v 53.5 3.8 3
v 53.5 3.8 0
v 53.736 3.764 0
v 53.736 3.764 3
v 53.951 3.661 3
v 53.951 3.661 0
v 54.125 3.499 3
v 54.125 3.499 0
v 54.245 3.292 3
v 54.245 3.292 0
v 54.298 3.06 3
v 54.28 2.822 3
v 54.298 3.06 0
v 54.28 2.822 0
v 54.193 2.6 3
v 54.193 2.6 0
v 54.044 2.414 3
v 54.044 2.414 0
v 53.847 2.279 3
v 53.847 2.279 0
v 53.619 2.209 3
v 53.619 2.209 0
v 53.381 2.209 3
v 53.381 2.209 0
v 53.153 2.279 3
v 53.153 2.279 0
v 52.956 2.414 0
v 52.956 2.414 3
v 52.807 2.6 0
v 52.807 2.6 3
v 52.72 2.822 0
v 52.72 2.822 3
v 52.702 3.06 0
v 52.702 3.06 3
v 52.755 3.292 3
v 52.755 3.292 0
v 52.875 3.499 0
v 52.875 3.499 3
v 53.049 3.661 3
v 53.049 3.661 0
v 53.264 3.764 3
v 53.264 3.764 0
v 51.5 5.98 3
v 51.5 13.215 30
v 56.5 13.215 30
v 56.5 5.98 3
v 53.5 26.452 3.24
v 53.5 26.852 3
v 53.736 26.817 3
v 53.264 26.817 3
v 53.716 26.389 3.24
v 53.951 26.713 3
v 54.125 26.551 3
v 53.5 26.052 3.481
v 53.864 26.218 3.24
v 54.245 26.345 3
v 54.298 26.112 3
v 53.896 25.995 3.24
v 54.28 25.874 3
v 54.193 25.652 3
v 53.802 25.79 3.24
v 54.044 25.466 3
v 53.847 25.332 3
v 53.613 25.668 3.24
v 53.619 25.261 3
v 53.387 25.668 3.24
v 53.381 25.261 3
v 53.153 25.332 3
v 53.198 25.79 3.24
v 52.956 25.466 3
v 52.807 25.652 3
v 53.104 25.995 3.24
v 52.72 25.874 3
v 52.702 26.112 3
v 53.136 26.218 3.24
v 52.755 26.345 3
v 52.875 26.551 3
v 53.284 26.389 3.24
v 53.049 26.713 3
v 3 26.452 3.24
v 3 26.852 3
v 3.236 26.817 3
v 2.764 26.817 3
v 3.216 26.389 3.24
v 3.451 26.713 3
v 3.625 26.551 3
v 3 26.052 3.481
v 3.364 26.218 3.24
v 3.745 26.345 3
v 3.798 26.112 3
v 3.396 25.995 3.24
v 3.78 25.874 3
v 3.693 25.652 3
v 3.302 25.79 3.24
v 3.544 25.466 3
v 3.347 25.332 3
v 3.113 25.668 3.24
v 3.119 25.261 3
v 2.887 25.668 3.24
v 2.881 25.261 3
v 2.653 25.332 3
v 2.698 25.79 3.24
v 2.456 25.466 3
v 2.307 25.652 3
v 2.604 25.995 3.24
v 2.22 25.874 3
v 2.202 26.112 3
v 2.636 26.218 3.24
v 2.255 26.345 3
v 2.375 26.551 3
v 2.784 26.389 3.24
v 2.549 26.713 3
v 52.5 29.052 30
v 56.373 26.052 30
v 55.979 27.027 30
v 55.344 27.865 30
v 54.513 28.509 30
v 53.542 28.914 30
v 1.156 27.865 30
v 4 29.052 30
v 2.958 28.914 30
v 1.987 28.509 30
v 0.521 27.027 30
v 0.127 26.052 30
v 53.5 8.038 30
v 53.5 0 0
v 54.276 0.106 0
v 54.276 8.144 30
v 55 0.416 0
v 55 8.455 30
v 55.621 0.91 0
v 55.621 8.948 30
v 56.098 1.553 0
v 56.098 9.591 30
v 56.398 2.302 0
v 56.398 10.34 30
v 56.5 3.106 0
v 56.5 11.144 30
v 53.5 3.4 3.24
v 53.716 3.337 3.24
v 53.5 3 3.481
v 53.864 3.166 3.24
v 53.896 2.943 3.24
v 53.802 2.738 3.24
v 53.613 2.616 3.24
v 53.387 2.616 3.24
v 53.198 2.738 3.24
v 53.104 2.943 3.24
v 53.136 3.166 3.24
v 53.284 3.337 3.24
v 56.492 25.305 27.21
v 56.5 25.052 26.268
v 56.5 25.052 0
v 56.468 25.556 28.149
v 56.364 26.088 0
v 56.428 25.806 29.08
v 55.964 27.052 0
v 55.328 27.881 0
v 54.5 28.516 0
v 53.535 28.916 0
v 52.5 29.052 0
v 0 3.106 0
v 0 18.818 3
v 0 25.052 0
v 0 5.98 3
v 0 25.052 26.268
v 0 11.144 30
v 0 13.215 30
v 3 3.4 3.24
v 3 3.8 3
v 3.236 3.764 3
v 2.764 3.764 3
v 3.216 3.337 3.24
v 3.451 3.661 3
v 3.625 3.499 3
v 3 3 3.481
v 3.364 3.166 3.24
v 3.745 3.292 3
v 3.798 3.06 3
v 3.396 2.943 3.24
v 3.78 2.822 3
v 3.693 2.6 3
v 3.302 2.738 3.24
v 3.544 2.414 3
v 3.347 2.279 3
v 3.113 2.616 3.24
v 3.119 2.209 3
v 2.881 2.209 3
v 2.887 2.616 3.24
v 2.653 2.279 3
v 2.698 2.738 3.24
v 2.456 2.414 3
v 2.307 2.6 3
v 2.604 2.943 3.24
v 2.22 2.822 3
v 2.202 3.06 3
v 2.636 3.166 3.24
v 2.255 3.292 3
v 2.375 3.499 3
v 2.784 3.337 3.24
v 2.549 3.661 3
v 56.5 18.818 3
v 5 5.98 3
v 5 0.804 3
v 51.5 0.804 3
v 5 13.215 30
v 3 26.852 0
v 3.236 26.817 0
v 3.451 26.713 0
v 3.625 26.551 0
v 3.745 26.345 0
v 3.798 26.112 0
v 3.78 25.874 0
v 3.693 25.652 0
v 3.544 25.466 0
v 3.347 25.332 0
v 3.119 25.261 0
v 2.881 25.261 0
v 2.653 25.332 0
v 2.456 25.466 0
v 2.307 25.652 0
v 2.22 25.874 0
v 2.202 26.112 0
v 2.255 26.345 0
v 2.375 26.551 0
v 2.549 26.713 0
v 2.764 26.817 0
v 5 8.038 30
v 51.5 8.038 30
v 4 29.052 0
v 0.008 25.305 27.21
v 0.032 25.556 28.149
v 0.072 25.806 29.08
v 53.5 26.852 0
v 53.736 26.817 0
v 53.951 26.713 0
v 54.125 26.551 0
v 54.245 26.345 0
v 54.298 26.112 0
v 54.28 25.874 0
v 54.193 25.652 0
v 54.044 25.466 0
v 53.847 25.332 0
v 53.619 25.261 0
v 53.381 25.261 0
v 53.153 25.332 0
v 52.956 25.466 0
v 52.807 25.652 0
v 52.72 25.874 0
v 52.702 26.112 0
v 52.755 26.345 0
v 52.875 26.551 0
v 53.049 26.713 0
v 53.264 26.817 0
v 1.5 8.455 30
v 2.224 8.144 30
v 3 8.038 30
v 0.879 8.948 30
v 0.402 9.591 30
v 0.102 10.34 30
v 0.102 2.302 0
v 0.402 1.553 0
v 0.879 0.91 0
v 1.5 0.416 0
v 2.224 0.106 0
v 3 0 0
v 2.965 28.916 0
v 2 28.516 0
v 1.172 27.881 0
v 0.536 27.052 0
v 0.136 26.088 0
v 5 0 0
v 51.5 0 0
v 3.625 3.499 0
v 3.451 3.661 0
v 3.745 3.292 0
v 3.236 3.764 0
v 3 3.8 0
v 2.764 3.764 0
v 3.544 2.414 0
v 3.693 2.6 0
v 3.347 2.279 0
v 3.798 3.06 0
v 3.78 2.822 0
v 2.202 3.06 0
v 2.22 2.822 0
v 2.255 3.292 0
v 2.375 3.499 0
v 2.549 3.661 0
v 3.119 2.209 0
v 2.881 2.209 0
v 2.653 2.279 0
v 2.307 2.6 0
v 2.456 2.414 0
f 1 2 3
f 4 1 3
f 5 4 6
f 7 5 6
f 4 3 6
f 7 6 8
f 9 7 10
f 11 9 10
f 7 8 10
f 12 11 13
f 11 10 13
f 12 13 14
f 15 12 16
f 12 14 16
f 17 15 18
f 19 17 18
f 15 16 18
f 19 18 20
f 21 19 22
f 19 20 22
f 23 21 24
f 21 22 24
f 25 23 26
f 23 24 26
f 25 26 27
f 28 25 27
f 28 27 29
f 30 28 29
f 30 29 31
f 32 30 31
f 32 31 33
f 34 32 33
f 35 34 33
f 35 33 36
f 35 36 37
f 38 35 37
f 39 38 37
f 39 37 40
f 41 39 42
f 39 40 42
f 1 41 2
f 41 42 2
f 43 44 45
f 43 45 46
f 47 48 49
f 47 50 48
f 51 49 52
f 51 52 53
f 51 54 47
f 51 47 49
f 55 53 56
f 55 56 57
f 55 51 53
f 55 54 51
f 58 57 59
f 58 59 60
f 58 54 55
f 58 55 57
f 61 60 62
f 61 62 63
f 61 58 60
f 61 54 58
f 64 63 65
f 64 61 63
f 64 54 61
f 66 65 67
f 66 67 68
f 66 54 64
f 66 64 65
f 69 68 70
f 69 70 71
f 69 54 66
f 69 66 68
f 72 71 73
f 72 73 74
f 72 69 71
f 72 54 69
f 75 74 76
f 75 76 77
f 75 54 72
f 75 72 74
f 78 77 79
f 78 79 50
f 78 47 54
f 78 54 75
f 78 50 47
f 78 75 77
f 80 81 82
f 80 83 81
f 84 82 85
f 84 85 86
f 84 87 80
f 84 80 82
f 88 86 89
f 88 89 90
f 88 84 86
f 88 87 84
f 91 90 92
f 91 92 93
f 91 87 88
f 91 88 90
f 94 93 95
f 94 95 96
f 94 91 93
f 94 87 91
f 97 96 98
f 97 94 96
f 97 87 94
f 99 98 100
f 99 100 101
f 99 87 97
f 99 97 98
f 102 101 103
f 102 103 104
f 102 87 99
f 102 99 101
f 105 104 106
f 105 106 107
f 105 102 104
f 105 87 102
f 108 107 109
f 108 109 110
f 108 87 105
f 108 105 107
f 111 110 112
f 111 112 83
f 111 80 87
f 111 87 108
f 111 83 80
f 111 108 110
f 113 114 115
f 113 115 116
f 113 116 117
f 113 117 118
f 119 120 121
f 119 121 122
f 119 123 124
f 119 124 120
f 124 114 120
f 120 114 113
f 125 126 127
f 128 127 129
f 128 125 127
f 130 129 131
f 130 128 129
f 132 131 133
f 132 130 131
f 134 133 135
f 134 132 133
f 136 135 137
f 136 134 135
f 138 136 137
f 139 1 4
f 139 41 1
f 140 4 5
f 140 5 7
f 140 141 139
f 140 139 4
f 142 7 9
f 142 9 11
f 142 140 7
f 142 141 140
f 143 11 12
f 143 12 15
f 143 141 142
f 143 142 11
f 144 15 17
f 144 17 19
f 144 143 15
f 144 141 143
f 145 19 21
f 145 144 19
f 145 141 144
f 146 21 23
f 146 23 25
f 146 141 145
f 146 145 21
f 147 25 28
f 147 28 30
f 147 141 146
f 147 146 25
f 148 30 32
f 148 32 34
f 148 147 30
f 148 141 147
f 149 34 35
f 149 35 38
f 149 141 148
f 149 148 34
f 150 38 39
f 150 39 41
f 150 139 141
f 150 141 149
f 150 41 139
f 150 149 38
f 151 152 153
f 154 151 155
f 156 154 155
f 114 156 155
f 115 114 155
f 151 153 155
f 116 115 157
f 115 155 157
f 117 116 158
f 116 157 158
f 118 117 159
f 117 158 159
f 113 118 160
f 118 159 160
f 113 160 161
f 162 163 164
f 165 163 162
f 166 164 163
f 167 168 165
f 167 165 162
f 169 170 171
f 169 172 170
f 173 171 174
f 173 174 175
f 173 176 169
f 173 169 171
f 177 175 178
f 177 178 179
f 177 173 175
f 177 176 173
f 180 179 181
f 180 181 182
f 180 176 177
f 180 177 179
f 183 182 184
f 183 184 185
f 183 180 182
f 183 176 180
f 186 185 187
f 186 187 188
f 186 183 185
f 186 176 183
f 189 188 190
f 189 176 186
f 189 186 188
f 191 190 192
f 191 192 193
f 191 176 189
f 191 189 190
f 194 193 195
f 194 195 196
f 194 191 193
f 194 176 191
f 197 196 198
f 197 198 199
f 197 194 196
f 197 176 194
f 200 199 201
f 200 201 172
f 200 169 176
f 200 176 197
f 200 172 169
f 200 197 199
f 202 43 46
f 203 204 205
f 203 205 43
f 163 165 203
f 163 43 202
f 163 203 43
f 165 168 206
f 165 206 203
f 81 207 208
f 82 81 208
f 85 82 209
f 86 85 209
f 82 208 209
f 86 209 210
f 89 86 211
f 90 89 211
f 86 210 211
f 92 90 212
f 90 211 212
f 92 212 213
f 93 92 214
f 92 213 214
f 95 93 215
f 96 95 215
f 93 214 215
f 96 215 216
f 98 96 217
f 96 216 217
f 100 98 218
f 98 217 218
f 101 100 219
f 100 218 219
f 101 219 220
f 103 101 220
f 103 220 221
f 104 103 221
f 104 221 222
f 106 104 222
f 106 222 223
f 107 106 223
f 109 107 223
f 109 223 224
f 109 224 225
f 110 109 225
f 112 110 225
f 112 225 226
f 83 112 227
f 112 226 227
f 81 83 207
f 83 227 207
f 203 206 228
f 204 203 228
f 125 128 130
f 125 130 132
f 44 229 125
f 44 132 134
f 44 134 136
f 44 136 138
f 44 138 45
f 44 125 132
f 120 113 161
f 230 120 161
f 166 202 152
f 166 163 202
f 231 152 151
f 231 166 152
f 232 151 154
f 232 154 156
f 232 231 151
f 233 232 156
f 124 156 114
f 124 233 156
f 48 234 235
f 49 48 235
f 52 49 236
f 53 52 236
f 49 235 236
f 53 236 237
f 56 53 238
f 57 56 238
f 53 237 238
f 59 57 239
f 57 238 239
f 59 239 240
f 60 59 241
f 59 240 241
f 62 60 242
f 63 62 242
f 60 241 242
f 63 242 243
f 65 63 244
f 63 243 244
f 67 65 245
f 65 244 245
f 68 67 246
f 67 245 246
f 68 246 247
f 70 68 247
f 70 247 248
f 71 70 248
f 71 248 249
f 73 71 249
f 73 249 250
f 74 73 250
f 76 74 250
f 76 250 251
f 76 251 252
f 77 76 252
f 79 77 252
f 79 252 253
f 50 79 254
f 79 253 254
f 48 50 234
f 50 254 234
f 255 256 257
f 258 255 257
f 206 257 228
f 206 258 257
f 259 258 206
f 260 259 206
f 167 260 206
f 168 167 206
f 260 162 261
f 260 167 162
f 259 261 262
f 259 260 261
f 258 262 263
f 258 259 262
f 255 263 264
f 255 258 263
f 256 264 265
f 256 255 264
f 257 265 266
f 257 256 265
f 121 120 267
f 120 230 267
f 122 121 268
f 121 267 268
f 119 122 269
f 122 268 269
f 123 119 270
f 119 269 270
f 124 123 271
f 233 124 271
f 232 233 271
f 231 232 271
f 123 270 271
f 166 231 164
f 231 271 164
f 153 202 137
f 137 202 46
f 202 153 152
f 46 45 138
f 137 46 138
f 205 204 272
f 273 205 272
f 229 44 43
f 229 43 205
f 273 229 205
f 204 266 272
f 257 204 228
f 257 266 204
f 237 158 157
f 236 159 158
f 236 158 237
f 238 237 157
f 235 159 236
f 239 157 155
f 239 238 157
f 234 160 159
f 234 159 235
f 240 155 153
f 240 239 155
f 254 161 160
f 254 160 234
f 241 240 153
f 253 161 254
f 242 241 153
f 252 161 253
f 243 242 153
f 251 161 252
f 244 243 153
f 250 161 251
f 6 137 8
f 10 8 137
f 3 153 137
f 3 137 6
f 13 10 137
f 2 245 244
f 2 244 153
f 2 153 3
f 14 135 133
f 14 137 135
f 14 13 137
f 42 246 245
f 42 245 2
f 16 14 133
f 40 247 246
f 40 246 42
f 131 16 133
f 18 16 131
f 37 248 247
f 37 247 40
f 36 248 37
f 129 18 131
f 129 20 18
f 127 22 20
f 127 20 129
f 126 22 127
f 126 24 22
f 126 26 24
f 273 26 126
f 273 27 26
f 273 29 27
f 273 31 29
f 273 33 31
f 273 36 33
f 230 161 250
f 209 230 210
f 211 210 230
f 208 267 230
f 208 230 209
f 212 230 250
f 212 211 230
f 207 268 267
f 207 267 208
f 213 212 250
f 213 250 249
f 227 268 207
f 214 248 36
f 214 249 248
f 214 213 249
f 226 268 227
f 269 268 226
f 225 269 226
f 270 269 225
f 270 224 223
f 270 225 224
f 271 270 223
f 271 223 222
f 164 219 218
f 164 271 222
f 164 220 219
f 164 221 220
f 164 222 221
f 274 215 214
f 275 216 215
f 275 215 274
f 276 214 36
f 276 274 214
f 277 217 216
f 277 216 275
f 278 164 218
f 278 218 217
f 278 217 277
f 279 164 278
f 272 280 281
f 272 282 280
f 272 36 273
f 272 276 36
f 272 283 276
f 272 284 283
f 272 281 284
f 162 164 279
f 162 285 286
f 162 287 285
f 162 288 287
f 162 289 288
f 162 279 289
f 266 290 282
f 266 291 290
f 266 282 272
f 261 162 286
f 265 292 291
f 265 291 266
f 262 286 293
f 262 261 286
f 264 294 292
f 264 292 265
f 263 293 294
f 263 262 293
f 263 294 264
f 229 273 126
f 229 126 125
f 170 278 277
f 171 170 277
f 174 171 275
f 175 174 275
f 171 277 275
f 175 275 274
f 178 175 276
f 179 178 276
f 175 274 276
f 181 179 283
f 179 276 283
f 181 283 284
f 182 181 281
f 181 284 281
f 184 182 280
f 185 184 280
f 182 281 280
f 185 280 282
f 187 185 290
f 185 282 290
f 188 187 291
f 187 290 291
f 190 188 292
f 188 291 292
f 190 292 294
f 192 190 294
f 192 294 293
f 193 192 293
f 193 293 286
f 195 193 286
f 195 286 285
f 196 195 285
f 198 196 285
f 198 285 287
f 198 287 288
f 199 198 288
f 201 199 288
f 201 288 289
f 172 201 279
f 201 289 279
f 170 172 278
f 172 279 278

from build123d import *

# Parameters (mm, degrees)
PAD_DEPTH    = 5
PAD001_DEPTH = 51.5
PAD002_DEPTH = 5
FILLET_R     = 3
FILLET001_R  = 4
SKETCH003_R  = 0.8
HOLE_DEPTH   = 3
HOLE_TIPS_R  = 0.8


with BuildPart() as part:
    # Sketch → Pad (new body)
    with BuildSketch(Plane.YZ):
        Polygon((0, 0), (8.038476, 30), (13.214857, 30), (5.980228, 3), (18.817653, 3), (26.052281, 30), (29.052281, 30), (29.052281, 0), align=None)
    extrude(amount=PAD_DEPTH)

    # Sketch001 → Pad001 (join)
    with BuildSketch(Plane.YZ):
        Polygon((0, 0), (29.052281, 0), (29.052281, 30), (26.052281, 30), (18.817653, 3), (0.803848, 3), align=None)
    extrude(amount=PAD001_DEPTH)

    # Sketch002 (on Face14 of Pad001) → Pad002 (join)
    with BuildSketch(Plane.YZ.offset(51.5)):
        Polygon((0, 0), (8.038476, 30), (13.214857, 30), (5.980228, 3), (18.817653, 3), (26.052281, 30), (29.052281, 30), (29.052281, 0), align=None)
    extrude(amount=PAD002_DEPTH)

    # Fillet
    fillet_edges = [part.edges().sort_by_distance(p)[0] for p in [
        (0, 4.421162, 16.5),
        (0, 0.401924, 1.5),
        (56.5, 4.019238, 15),
    ]]
    fillet(fillet_edges, radius=FILLET_R)

    # Fillet001
    fillet001_edges = [part.edges().sort_by_distance(p)[0] for p in [
        (0, 29.052281, 15),
        (56.5, 29.052281, 15),
    ]]
    fillet(fillet001_edges, radius=FILLET001_R)

    # Sketch003 (on Face13 of Pad002) → Hole (cut)
    with BuildSketch(Plane.YX):
        with Locations((3, 53.5)):
            Circle(SKETCH003_R)
        with Locations((26.052281, 53.5)):
            Circle(SKETCH003_R)
        with Locations((3, 3)):
            Circle(SKETCH003_R)
        with Locations((26.052281, 3)):
            Circle(SKETCH003_R)
    extrude(amount=-HOLE_DEPTH, mode=Mode.SUBTRACT)

    # Hole tips → Hole tip 1 section 0
    with BuildSketch(Plane.YX.offset(-3), mode=Mode.PRIVATE) as hole_tip_1_s0:
        with Locations((3, 53.5)):
            Circle(HOLE_TIPS_R)
    loft([hole_tip_1_s0.sketch, Vertex(53.5, 3, 3.480688)], mode=Mode.SUBTRACT)

    # Hole tips → Hole tip 2 section 0
    with BuildSketch(Plane.YX.offset(-3), mode=Mode.PRIVATE) as hole_tip_2_s0:
        with Locations((26.052281, 53.5)):
            Circle(HOLE_TIPS_R)
    loft([hole_tip_2_s0.sketch, Vertex(53.5, 26.052281, 3.480688)], mode=Mode.SUBTRACT)

    # Hole tips → Hole tip 3 section 0
    with BuildSketch(Plane.YX.offset(-3), mode=Mode.PRIVATE) as hole_tip_3_s0:
        with Locations((3, 3)):
            Circle(HOLE_TIPS_R)
    loft([hole_tip_3_s0.sketch, Vertex(3, 3, 3.480688)], mode=Mode.SUBTRACT)

    # Hole tips → Hole tip 4 section 0
    with BuildSketch(Plane.YX.offset(-3), mode=Mode.PRIVATE) as hole_tip_4_s0:
        with Locations((26.052281, 3)):
            Circle(HOLE_TIPS_R)
    loft([hole_tip_4_s0.sketch, Vertex(3, 26.052281, 3.480688)], mode=Mode.SUBTRACT)


solid = part.part
